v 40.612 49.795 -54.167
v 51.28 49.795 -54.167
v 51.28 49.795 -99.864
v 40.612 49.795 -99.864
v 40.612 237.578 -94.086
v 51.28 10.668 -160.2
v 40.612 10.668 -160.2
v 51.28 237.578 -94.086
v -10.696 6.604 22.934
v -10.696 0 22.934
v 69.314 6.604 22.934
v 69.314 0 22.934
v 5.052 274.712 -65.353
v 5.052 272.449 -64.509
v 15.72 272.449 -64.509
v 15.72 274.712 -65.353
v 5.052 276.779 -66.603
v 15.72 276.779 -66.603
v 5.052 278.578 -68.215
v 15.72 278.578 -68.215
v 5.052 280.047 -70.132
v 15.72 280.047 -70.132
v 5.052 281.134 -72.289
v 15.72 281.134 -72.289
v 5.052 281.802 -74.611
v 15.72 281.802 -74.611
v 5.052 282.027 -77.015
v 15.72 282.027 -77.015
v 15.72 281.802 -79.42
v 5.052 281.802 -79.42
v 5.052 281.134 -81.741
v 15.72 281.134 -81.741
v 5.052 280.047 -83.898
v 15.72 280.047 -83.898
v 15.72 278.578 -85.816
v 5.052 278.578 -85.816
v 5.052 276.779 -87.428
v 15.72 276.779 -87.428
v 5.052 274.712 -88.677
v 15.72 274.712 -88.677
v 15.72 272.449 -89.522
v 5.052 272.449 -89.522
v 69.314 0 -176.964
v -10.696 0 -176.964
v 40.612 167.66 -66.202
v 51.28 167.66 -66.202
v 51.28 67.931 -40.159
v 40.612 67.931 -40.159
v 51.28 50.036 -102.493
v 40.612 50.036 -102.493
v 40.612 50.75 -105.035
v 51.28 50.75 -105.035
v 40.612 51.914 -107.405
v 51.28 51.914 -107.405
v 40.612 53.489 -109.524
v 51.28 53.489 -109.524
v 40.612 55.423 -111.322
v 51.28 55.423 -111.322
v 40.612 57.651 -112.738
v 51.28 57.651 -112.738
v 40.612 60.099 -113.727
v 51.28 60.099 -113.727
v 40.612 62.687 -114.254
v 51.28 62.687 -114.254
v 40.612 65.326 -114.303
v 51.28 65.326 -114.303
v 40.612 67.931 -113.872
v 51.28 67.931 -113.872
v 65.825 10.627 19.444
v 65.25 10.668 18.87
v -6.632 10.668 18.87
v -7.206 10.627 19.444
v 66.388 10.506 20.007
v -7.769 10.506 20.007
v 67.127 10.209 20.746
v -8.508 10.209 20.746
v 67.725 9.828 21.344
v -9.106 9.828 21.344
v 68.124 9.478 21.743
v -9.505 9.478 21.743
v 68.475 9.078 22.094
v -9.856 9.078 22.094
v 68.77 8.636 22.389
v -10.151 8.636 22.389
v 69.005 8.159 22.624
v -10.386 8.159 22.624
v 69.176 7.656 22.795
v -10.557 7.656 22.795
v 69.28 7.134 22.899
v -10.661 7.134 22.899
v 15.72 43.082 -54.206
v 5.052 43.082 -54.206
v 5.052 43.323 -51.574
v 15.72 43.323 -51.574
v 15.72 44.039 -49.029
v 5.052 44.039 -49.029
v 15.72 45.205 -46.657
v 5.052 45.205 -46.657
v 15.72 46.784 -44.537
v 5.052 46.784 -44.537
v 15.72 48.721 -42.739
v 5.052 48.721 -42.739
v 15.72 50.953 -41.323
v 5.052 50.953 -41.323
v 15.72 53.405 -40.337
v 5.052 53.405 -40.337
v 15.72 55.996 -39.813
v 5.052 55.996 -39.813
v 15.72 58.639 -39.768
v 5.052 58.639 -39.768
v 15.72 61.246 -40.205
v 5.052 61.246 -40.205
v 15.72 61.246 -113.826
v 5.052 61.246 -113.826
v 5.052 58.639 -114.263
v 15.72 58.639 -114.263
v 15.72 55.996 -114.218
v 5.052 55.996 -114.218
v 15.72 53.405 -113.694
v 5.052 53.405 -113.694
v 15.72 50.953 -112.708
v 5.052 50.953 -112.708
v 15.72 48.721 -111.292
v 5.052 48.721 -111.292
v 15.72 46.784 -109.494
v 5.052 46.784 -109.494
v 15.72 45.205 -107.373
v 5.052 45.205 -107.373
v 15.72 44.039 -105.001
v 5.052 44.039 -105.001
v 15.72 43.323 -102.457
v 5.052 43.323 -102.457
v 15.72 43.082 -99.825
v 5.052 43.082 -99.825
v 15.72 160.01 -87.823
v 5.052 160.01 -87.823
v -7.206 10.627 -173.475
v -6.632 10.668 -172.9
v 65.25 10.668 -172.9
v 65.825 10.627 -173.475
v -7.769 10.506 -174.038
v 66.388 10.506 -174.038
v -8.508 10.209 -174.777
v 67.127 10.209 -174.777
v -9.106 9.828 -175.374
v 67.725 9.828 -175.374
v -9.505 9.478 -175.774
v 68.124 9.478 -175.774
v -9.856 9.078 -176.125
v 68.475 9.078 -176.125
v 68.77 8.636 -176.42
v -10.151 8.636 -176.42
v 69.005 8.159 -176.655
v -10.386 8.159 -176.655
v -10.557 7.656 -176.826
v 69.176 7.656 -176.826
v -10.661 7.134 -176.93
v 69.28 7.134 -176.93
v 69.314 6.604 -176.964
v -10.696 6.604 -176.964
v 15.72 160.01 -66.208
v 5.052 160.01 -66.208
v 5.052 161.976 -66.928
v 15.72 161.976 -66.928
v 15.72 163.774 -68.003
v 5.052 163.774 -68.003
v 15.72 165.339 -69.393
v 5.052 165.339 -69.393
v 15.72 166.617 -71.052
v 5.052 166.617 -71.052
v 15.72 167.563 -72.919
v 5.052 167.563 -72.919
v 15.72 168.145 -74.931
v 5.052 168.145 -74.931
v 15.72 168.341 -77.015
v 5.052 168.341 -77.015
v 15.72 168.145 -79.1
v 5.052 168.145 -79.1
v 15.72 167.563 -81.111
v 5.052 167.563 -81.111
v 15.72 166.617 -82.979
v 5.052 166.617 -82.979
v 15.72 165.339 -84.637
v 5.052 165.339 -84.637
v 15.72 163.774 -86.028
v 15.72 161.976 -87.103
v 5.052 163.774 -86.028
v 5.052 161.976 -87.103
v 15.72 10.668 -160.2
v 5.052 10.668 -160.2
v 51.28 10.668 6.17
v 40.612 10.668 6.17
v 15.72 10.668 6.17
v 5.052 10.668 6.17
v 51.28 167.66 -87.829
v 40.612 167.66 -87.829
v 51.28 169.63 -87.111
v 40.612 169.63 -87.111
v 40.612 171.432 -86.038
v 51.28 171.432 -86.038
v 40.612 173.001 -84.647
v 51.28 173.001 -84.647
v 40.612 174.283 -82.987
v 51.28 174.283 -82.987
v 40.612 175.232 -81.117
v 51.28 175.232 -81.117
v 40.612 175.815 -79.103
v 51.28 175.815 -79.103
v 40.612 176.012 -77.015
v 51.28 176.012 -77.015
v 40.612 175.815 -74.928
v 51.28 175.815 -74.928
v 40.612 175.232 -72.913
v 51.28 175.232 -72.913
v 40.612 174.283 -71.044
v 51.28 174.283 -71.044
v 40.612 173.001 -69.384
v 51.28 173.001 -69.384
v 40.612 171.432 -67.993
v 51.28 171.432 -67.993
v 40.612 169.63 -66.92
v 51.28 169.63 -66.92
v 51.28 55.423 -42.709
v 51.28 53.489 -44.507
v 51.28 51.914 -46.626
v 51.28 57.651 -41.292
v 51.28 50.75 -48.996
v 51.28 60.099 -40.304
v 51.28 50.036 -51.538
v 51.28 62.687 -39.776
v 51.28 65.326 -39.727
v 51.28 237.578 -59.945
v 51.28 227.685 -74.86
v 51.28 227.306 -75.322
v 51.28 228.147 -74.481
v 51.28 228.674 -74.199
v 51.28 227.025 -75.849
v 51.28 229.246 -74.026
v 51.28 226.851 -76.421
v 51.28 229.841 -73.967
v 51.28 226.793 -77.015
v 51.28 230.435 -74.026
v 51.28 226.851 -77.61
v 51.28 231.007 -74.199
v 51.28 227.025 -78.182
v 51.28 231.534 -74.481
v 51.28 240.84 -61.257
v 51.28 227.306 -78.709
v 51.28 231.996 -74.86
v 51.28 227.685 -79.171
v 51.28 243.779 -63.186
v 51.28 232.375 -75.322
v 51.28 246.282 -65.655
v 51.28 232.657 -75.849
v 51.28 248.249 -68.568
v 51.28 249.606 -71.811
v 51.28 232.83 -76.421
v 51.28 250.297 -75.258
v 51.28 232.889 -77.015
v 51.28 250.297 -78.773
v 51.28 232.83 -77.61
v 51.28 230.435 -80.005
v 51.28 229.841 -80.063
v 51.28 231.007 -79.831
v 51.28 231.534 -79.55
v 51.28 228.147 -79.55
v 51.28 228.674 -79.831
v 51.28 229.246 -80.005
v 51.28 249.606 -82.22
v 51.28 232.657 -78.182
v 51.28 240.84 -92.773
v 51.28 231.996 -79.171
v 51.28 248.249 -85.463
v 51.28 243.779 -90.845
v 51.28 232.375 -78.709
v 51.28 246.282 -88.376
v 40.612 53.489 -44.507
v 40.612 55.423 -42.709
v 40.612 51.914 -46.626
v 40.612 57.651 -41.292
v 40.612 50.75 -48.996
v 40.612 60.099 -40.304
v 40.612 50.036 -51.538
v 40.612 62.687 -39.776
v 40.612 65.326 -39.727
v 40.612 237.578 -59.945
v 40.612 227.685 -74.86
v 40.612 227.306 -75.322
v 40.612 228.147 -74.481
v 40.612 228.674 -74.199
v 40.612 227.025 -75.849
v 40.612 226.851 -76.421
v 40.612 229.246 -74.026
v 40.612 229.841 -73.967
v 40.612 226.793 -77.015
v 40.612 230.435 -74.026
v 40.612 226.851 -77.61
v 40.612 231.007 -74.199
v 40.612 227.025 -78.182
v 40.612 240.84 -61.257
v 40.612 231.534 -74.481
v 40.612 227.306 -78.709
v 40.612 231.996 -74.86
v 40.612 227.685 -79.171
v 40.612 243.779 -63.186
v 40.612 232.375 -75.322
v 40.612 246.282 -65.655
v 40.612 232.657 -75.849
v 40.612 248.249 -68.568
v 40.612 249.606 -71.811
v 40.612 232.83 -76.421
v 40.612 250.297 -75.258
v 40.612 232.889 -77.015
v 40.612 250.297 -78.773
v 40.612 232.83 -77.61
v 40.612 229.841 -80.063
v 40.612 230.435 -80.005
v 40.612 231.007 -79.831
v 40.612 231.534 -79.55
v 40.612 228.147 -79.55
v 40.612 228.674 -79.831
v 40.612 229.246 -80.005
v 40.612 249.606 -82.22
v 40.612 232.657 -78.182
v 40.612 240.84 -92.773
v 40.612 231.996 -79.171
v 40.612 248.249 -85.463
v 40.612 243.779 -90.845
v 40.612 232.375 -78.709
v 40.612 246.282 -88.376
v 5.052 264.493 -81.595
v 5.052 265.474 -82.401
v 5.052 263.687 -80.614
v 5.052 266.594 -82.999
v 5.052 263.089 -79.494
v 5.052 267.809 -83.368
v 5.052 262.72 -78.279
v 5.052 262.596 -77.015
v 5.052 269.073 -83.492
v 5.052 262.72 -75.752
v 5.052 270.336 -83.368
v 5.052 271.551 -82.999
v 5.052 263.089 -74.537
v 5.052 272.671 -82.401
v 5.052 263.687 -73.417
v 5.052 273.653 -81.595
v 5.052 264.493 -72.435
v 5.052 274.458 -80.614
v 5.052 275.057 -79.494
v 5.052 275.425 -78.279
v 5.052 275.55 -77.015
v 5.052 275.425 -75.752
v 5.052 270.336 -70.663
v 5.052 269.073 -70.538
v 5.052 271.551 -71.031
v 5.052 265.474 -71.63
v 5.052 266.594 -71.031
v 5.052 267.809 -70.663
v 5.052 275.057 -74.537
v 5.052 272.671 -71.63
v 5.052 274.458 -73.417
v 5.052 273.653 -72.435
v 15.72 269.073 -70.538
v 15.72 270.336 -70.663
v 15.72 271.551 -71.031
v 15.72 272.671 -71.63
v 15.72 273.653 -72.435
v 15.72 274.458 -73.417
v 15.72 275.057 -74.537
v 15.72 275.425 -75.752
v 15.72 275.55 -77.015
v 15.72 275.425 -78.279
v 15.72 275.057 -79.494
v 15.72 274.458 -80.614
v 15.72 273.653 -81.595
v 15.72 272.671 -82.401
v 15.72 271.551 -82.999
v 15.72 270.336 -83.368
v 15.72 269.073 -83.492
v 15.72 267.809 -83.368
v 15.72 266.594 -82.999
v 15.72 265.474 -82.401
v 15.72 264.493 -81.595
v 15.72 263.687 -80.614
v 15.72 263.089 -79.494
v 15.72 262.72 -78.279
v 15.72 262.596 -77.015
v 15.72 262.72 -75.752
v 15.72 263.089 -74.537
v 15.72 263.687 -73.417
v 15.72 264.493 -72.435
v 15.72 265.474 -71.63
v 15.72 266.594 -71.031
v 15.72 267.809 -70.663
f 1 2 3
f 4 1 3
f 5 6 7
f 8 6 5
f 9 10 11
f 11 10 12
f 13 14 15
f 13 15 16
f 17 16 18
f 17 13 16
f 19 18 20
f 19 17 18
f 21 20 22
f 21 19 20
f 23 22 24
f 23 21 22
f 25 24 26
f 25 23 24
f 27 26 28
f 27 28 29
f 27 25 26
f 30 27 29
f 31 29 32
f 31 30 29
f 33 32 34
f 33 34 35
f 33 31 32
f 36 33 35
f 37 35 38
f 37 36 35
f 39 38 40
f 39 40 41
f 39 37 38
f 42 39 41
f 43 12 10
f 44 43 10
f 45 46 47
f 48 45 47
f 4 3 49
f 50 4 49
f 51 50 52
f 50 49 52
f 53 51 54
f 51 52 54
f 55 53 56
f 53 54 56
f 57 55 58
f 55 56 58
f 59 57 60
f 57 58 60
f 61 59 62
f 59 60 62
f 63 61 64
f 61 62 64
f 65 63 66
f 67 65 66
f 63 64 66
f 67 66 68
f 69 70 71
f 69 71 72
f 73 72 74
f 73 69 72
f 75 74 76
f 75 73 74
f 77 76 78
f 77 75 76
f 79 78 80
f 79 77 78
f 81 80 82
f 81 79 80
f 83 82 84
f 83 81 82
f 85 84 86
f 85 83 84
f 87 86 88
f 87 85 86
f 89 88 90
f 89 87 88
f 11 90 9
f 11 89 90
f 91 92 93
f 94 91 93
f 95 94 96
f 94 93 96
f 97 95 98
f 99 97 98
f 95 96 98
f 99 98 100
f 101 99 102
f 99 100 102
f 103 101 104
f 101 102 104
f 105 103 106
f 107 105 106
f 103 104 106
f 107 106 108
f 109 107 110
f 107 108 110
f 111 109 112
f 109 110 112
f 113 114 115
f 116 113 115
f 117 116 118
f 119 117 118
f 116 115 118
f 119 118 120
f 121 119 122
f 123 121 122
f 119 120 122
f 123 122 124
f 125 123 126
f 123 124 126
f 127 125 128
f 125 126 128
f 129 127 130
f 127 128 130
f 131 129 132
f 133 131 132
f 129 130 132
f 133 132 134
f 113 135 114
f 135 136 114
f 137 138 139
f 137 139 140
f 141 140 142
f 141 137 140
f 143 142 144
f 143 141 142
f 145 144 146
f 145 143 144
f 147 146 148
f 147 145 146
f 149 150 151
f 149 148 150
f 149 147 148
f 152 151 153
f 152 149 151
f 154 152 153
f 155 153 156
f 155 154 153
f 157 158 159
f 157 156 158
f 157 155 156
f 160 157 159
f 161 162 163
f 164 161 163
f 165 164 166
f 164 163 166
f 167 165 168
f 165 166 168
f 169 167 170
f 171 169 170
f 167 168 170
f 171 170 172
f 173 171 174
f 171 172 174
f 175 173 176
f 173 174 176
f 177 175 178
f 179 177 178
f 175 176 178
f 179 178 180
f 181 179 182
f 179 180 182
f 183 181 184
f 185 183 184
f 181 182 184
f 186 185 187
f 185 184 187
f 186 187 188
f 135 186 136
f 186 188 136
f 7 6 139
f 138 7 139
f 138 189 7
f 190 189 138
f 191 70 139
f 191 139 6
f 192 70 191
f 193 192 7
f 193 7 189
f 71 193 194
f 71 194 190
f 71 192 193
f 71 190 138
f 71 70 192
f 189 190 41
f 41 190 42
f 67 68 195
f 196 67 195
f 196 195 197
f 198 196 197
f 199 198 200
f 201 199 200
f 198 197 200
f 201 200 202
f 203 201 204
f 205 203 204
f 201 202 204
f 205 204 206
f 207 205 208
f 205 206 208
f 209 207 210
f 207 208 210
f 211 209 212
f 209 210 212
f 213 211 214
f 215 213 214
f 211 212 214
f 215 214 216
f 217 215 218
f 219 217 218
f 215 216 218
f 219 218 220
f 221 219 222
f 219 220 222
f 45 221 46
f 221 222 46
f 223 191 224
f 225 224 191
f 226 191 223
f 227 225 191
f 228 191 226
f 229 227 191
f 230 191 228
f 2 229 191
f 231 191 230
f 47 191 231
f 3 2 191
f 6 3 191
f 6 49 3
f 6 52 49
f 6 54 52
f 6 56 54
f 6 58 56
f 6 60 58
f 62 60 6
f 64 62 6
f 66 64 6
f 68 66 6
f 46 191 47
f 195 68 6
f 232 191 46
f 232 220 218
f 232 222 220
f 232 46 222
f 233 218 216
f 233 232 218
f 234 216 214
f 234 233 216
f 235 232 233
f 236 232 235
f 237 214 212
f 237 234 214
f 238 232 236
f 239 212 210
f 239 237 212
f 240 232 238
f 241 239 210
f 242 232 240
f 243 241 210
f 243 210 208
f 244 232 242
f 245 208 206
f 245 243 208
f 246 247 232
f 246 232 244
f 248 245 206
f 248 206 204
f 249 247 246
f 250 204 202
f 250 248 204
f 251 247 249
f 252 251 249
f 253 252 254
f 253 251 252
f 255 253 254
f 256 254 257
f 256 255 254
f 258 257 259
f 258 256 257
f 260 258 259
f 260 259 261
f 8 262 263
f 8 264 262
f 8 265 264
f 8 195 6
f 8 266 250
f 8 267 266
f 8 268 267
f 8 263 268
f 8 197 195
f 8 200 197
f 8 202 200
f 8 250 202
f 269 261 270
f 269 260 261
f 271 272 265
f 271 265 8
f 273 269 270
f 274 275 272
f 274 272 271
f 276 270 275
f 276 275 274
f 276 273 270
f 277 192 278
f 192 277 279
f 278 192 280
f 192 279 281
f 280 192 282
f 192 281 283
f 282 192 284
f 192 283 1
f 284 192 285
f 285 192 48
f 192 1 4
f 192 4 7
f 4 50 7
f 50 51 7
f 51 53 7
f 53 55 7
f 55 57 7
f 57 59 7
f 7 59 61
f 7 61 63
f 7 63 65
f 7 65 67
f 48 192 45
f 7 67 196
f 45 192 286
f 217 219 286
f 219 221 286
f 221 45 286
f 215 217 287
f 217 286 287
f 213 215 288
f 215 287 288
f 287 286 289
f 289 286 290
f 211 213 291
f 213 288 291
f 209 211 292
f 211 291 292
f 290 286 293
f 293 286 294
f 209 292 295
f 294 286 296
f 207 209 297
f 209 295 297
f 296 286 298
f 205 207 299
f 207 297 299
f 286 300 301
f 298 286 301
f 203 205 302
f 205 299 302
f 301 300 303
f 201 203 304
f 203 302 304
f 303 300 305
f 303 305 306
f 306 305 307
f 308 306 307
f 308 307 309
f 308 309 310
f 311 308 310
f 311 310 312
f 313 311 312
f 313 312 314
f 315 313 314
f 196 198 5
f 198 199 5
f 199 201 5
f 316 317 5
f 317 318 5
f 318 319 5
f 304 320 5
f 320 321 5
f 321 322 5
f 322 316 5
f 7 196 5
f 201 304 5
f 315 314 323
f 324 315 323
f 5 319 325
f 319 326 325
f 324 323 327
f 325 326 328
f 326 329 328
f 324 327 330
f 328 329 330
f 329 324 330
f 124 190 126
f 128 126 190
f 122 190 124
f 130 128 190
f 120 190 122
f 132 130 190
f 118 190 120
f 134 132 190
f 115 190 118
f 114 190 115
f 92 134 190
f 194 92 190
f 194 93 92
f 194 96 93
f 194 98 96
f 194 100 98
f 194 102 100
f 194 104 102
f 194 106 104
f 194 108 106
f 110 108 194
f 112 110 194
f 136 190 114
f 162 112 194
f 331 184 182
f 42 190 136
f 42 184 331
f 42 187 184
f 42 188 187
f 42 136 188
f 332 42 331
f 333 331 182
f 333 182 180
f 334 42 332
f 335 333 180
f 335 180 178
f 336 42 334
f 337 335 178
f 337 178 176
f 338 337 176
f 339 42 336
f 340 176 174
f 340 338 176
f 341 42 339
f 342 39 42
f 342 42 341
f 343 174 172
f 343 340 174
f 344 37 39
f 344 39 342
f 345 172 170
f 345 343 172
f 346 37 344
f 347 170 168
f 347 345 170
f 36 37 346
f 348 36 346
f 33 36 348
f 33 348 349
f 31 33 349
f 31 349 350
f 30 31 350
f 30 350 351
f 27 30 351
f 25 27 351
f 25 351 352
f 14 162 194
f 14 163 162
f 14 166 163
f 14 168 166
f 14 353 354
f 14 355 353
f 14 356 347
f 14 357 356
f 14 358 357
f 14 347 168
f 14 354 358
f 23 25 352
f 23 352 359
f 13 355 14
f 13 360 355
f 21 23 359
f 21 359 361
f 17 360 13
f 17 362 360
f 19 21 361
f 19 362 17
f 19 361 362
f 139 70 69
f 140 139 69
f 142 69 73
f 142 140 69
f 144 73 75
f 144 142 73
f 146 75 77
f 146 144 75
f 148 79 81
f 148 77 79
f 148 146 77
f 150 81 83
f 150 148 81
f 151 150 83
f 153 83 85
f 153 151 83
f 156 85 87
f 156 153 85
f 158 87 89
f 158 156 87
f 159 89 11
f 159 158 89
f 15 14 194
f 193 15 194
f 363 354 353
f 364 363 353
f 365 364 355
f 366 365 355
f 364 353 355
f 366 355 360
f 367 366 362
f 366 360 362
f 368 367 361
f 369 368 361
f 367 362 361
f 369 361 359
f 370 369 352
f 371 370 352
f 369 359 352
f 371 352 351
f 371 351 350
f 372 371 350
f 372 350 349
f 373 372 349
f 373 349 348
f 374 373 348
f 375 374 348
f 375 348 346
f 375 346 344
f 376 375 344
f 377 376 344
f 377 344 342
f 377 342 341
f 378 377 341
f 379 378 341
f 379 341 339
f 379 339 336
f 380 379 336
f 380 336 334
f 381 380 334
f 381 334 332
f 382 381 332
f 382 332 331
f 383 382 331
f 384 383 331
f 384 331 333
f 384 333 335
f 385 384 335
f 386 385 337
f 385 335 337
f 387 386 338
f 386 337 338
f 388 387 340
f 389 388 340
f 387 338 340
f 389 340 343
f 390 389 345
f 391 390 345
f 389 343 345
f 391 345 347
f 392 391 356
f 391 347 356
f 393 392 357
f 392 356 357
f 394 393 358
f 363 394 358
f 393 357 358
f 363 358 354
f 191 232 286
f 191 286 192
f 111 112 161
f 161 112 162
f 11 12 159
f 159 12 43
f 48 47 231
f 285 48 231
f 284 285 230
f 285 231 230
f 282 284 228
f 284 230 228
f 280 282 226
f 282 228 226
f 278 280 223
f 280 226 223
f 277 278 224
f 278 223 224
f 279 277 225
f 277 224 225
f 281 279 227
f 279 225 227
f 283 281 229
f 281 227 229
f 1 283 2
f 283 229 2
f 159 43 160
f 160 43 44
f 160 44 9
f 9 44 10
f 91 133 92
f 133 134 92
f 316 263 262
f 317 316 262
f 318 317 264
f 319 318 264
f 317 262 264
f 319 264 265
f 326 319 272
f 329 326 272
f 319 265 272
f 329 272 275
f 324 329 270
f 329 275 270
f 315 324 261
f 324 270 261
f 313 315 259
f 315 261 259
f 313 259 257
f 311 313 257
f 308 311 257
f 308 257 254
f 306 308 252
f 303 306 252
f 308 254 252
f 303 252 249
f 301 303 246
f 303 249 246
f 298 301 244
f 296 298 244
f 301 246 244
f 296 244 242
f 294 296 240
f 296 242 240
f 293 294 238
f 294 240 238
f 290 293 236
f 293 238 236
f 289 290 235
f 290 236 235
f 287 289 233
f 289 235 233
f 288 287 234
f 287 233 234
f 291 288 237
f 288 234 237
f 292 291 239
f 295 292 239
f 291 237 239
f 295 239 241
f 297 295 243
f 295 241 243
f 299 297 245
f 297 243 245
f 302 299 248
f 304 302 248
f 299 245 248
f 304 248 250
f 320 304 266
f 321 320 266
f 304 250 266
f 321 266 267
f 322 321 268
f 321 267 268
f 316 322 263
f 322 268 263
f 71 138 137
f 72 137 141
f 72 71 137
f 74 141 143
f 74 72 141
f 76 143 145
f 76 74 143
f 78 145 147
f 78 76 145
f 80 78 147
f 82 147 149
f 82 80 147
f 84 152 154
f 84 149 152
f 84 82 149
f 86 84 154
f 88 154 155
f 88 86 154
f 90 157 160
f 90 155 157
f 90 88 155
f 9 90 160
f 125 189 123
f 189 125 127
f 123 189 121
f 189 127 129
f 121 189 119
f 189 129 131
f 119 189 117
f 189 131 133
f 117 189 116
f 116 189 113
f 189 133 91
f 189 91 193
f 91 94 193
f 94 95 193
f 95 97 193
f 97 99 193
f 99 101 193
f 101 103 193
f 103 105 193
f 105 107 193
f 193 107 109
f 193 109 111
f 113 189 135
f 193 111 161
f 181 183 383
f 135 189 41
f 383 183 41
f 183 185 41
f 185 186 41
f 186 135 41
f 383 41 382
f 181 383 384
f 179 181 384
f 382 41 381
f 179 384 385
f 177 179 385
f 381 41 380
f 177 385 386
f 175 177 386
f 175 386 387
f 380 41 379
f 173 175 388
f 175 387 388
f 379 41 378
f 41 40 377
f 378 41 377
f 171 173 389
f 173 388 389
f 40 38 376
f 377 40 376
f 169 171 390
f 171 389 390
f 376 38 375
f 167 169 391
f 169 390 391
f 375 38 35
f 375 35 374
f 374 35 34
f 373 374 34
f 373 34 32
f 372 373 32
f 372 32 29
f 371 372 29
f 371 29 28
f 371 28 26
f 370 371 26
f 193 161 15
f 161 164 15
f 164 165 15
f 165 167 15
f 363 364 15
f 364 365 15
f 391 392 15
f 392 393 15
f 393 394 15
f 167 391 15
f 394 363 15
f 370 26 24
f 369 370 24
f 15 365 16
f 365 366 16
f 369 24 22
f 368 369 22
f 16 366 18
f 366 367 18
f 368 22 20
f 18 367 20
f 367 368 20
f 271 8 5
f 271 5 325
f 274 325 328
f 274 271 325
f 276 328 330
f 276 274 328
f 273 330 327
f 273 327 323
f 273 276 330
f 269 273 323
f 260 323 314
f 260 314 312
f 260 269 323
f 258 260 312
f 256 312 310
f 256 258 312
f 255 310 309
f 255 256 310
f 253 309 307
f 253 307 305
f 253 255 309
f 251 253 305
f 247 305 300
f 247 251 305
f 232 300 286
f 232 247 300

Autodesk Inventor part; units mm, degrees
ref_plane "YZ Plane" through (0, 0, 0) normal (1, 0, 0) x (0, 1, 0)
sketch "Sketch1" plane through (0, 0, 0) normal (0, 1, 0) x (-1, 0, 0)
  line L0 (10.6955, 22.9336) -> (-69.3145, 22.9336)
  line L1 (-69.3145, 22.9336) -> (-69.3145, -176.9644)
  line L2 (-69.3145, -176.9644) -> (10.6955, -176.9644)
  line L3 (10.6955, -176.9644) -> (10.6955, 22.9336)
  point P0 (0, 0)
  dimension "d0" = 80.01
  dimension "d1" = 199.898
extrude "Extrusion1" add sketch "Sketch1" along normal blind 10.668
fillet "Fillet1" radius 4.064 4 edges at (29.3095, 10.668, 22.9336) (69.3145, 10.668, -77.0154) (29.3095, 10.668, -176.9644) (-10.6955, 10.668, -77.0154)
ref_plane "Work Plane1" through (51.2805, 0, 22.9336) normal (1, 0, 0) x (0, 0, -1)
sketch "Sketch2" plane through (51.2805, 0, 22.9336) normal (1, 0, 0) x (0, 0, -1)
  line L0 (195.834, 10.668) -> (4.064, 10.668) construction
  line L1 (195.834, 10.668) -> (183.134, 10.668) construction
  arc A0 (4.064, 10.668) -> (0, 6.604) centre (4.064, 6.604) ccw construction
  line L2 (4.064, 10.668) -> (16.764, 10.668) construction
  line L3 (82.8788, 237.5782) -> (16.764, 10.668)
  line L4 (183.134, 10.668) -> (117.0192, 237.5782)
  line L5 (77.1008, 49.7952) -> (122.7972, 49.7952)
  line L6 (136.8055, 67.9313) -> (110.7624, 167.66)
  line L7 (89.1356, 167.66) -> (63.0925, 67.9313)
  arc A1 (117.0192, 237.5782) -> (82.8788, 237.5782) centre (99.949, 232.6044) ccw
  arc A2 (110.7624, 167.66) -> (89.1356, 167.66) centre (99.949, 164.8362) ccw
  arc A3 (63.0925, 67.9313) -> (77.1008, 49.7952) centre (77.1008, 64.2732) ccw
  arc A4 (122.7972, 49.7952) -> (136.8055, 67.9313) centre (122.7972, 64.2732) ccw
  line L8 (16.764, 10.668) -> (183.134, 10.668)
  point P0 (22.9336, 0)
  dimension "d6" = 12.7
  dimension "d7" = 12.7
  dimension "d9" = 17.78
  dimension "d10" = 11.176
  dimension "d11" = 14.478
extrude "Extrusion2" add sketch "Sketch2" against normal blind 10.668
sketch "Sketch3" plane through (51.2805, 0, 22.9336) normal (1, 0, 0) x (0, 0, -1)
  line L0 (16.764, 10.668) -> (183.134, 10.668) projected
  circle A0 centre (99.949, 229.8407) radius 3.048
  point P0 (22.9336, 0)
  dimension "d15" = 6.096
extrude "Extrusion3" cut sketch "Sketch3" against normal up to next
ref_plane "Work Plane2" through (5.0525, 0, -176.9644) normal (-1, 0, 0) x (0, 0, 1)
sketch "Sketch4" plane through (5.0525, 0, -176.9644) normal (-1, 0, 0) x (0, 0, 1)
  line L0 (16.764, 10.668) -> (183.134, 10.668) projected
  line L1 (117.0192, 237.5782) -> (183.134, 10.668) projected
  line L2 (16.764, 10.668) -> (183.134, 10.668)
  line L3 (16.764, 10.668) -> (87.4428, 272.4493)
  line L4 (112.4552, 272.4493) -> (183.134, 10.668)
  line L5 (16.764, 10.668) -> (183.134, 10.668)
  line L6 (77.1396, 43.0817) -> (122.7584, 43.0817)
  line L7 (136.7593, 61.2458) -> (110.7567, 160.0105)
  line L8 (89.1413, 160.0105) -> (63.1387, 61.2458)
  arc A0 (110.7567, 160.0105) -> (89.1413, 160.0105) centre (99.949, 157.1651) ccw
  arc A1 (63.1387, 61.2458) -> (77.1396, 43.0817) centre (77.1396, 57.5597) ccw
  arc A2 (122.7584, 43.0817) -> (136.7593, 61.2458) centre (122.7584, 57.5597) ccw
  line L9 (16.764, 10.668) -> (183.134, 10.668)
  arc A3 (112.4552, 272.4493) -> (87.4428, 272.4493) centre (99.949, 269.0728) ccw
  point P0 (176.9644, 0)
  point P1 (99.949, 318.77)
  point P2 (99.949, 201.0611)
  dimension "d21" = 11.176
  dimension "d22" = 14.478
  dimension "d25" = 12.954
extrude "Extrusion4" add sketch "Sketch4" against normal blind 10.668
sketch "Sketch5" plane through (5.0525, 0, -176.9644) normal (-1, 0, 0) x (0, 0, 1)
  arc A0 (112.4552, 272.4493) -> (87.4428, 272.4493) centre (99.949, 269.0728) ccw projected
  circle A1 centre (99.949, 269.0728) radius 6.477
  point P0 (176.9644, 0)
  dimension "d26" = 12.954
extrude "Extrusion5" cut sketch "Sketch5" against normal up to next
properties part number "Stand"
